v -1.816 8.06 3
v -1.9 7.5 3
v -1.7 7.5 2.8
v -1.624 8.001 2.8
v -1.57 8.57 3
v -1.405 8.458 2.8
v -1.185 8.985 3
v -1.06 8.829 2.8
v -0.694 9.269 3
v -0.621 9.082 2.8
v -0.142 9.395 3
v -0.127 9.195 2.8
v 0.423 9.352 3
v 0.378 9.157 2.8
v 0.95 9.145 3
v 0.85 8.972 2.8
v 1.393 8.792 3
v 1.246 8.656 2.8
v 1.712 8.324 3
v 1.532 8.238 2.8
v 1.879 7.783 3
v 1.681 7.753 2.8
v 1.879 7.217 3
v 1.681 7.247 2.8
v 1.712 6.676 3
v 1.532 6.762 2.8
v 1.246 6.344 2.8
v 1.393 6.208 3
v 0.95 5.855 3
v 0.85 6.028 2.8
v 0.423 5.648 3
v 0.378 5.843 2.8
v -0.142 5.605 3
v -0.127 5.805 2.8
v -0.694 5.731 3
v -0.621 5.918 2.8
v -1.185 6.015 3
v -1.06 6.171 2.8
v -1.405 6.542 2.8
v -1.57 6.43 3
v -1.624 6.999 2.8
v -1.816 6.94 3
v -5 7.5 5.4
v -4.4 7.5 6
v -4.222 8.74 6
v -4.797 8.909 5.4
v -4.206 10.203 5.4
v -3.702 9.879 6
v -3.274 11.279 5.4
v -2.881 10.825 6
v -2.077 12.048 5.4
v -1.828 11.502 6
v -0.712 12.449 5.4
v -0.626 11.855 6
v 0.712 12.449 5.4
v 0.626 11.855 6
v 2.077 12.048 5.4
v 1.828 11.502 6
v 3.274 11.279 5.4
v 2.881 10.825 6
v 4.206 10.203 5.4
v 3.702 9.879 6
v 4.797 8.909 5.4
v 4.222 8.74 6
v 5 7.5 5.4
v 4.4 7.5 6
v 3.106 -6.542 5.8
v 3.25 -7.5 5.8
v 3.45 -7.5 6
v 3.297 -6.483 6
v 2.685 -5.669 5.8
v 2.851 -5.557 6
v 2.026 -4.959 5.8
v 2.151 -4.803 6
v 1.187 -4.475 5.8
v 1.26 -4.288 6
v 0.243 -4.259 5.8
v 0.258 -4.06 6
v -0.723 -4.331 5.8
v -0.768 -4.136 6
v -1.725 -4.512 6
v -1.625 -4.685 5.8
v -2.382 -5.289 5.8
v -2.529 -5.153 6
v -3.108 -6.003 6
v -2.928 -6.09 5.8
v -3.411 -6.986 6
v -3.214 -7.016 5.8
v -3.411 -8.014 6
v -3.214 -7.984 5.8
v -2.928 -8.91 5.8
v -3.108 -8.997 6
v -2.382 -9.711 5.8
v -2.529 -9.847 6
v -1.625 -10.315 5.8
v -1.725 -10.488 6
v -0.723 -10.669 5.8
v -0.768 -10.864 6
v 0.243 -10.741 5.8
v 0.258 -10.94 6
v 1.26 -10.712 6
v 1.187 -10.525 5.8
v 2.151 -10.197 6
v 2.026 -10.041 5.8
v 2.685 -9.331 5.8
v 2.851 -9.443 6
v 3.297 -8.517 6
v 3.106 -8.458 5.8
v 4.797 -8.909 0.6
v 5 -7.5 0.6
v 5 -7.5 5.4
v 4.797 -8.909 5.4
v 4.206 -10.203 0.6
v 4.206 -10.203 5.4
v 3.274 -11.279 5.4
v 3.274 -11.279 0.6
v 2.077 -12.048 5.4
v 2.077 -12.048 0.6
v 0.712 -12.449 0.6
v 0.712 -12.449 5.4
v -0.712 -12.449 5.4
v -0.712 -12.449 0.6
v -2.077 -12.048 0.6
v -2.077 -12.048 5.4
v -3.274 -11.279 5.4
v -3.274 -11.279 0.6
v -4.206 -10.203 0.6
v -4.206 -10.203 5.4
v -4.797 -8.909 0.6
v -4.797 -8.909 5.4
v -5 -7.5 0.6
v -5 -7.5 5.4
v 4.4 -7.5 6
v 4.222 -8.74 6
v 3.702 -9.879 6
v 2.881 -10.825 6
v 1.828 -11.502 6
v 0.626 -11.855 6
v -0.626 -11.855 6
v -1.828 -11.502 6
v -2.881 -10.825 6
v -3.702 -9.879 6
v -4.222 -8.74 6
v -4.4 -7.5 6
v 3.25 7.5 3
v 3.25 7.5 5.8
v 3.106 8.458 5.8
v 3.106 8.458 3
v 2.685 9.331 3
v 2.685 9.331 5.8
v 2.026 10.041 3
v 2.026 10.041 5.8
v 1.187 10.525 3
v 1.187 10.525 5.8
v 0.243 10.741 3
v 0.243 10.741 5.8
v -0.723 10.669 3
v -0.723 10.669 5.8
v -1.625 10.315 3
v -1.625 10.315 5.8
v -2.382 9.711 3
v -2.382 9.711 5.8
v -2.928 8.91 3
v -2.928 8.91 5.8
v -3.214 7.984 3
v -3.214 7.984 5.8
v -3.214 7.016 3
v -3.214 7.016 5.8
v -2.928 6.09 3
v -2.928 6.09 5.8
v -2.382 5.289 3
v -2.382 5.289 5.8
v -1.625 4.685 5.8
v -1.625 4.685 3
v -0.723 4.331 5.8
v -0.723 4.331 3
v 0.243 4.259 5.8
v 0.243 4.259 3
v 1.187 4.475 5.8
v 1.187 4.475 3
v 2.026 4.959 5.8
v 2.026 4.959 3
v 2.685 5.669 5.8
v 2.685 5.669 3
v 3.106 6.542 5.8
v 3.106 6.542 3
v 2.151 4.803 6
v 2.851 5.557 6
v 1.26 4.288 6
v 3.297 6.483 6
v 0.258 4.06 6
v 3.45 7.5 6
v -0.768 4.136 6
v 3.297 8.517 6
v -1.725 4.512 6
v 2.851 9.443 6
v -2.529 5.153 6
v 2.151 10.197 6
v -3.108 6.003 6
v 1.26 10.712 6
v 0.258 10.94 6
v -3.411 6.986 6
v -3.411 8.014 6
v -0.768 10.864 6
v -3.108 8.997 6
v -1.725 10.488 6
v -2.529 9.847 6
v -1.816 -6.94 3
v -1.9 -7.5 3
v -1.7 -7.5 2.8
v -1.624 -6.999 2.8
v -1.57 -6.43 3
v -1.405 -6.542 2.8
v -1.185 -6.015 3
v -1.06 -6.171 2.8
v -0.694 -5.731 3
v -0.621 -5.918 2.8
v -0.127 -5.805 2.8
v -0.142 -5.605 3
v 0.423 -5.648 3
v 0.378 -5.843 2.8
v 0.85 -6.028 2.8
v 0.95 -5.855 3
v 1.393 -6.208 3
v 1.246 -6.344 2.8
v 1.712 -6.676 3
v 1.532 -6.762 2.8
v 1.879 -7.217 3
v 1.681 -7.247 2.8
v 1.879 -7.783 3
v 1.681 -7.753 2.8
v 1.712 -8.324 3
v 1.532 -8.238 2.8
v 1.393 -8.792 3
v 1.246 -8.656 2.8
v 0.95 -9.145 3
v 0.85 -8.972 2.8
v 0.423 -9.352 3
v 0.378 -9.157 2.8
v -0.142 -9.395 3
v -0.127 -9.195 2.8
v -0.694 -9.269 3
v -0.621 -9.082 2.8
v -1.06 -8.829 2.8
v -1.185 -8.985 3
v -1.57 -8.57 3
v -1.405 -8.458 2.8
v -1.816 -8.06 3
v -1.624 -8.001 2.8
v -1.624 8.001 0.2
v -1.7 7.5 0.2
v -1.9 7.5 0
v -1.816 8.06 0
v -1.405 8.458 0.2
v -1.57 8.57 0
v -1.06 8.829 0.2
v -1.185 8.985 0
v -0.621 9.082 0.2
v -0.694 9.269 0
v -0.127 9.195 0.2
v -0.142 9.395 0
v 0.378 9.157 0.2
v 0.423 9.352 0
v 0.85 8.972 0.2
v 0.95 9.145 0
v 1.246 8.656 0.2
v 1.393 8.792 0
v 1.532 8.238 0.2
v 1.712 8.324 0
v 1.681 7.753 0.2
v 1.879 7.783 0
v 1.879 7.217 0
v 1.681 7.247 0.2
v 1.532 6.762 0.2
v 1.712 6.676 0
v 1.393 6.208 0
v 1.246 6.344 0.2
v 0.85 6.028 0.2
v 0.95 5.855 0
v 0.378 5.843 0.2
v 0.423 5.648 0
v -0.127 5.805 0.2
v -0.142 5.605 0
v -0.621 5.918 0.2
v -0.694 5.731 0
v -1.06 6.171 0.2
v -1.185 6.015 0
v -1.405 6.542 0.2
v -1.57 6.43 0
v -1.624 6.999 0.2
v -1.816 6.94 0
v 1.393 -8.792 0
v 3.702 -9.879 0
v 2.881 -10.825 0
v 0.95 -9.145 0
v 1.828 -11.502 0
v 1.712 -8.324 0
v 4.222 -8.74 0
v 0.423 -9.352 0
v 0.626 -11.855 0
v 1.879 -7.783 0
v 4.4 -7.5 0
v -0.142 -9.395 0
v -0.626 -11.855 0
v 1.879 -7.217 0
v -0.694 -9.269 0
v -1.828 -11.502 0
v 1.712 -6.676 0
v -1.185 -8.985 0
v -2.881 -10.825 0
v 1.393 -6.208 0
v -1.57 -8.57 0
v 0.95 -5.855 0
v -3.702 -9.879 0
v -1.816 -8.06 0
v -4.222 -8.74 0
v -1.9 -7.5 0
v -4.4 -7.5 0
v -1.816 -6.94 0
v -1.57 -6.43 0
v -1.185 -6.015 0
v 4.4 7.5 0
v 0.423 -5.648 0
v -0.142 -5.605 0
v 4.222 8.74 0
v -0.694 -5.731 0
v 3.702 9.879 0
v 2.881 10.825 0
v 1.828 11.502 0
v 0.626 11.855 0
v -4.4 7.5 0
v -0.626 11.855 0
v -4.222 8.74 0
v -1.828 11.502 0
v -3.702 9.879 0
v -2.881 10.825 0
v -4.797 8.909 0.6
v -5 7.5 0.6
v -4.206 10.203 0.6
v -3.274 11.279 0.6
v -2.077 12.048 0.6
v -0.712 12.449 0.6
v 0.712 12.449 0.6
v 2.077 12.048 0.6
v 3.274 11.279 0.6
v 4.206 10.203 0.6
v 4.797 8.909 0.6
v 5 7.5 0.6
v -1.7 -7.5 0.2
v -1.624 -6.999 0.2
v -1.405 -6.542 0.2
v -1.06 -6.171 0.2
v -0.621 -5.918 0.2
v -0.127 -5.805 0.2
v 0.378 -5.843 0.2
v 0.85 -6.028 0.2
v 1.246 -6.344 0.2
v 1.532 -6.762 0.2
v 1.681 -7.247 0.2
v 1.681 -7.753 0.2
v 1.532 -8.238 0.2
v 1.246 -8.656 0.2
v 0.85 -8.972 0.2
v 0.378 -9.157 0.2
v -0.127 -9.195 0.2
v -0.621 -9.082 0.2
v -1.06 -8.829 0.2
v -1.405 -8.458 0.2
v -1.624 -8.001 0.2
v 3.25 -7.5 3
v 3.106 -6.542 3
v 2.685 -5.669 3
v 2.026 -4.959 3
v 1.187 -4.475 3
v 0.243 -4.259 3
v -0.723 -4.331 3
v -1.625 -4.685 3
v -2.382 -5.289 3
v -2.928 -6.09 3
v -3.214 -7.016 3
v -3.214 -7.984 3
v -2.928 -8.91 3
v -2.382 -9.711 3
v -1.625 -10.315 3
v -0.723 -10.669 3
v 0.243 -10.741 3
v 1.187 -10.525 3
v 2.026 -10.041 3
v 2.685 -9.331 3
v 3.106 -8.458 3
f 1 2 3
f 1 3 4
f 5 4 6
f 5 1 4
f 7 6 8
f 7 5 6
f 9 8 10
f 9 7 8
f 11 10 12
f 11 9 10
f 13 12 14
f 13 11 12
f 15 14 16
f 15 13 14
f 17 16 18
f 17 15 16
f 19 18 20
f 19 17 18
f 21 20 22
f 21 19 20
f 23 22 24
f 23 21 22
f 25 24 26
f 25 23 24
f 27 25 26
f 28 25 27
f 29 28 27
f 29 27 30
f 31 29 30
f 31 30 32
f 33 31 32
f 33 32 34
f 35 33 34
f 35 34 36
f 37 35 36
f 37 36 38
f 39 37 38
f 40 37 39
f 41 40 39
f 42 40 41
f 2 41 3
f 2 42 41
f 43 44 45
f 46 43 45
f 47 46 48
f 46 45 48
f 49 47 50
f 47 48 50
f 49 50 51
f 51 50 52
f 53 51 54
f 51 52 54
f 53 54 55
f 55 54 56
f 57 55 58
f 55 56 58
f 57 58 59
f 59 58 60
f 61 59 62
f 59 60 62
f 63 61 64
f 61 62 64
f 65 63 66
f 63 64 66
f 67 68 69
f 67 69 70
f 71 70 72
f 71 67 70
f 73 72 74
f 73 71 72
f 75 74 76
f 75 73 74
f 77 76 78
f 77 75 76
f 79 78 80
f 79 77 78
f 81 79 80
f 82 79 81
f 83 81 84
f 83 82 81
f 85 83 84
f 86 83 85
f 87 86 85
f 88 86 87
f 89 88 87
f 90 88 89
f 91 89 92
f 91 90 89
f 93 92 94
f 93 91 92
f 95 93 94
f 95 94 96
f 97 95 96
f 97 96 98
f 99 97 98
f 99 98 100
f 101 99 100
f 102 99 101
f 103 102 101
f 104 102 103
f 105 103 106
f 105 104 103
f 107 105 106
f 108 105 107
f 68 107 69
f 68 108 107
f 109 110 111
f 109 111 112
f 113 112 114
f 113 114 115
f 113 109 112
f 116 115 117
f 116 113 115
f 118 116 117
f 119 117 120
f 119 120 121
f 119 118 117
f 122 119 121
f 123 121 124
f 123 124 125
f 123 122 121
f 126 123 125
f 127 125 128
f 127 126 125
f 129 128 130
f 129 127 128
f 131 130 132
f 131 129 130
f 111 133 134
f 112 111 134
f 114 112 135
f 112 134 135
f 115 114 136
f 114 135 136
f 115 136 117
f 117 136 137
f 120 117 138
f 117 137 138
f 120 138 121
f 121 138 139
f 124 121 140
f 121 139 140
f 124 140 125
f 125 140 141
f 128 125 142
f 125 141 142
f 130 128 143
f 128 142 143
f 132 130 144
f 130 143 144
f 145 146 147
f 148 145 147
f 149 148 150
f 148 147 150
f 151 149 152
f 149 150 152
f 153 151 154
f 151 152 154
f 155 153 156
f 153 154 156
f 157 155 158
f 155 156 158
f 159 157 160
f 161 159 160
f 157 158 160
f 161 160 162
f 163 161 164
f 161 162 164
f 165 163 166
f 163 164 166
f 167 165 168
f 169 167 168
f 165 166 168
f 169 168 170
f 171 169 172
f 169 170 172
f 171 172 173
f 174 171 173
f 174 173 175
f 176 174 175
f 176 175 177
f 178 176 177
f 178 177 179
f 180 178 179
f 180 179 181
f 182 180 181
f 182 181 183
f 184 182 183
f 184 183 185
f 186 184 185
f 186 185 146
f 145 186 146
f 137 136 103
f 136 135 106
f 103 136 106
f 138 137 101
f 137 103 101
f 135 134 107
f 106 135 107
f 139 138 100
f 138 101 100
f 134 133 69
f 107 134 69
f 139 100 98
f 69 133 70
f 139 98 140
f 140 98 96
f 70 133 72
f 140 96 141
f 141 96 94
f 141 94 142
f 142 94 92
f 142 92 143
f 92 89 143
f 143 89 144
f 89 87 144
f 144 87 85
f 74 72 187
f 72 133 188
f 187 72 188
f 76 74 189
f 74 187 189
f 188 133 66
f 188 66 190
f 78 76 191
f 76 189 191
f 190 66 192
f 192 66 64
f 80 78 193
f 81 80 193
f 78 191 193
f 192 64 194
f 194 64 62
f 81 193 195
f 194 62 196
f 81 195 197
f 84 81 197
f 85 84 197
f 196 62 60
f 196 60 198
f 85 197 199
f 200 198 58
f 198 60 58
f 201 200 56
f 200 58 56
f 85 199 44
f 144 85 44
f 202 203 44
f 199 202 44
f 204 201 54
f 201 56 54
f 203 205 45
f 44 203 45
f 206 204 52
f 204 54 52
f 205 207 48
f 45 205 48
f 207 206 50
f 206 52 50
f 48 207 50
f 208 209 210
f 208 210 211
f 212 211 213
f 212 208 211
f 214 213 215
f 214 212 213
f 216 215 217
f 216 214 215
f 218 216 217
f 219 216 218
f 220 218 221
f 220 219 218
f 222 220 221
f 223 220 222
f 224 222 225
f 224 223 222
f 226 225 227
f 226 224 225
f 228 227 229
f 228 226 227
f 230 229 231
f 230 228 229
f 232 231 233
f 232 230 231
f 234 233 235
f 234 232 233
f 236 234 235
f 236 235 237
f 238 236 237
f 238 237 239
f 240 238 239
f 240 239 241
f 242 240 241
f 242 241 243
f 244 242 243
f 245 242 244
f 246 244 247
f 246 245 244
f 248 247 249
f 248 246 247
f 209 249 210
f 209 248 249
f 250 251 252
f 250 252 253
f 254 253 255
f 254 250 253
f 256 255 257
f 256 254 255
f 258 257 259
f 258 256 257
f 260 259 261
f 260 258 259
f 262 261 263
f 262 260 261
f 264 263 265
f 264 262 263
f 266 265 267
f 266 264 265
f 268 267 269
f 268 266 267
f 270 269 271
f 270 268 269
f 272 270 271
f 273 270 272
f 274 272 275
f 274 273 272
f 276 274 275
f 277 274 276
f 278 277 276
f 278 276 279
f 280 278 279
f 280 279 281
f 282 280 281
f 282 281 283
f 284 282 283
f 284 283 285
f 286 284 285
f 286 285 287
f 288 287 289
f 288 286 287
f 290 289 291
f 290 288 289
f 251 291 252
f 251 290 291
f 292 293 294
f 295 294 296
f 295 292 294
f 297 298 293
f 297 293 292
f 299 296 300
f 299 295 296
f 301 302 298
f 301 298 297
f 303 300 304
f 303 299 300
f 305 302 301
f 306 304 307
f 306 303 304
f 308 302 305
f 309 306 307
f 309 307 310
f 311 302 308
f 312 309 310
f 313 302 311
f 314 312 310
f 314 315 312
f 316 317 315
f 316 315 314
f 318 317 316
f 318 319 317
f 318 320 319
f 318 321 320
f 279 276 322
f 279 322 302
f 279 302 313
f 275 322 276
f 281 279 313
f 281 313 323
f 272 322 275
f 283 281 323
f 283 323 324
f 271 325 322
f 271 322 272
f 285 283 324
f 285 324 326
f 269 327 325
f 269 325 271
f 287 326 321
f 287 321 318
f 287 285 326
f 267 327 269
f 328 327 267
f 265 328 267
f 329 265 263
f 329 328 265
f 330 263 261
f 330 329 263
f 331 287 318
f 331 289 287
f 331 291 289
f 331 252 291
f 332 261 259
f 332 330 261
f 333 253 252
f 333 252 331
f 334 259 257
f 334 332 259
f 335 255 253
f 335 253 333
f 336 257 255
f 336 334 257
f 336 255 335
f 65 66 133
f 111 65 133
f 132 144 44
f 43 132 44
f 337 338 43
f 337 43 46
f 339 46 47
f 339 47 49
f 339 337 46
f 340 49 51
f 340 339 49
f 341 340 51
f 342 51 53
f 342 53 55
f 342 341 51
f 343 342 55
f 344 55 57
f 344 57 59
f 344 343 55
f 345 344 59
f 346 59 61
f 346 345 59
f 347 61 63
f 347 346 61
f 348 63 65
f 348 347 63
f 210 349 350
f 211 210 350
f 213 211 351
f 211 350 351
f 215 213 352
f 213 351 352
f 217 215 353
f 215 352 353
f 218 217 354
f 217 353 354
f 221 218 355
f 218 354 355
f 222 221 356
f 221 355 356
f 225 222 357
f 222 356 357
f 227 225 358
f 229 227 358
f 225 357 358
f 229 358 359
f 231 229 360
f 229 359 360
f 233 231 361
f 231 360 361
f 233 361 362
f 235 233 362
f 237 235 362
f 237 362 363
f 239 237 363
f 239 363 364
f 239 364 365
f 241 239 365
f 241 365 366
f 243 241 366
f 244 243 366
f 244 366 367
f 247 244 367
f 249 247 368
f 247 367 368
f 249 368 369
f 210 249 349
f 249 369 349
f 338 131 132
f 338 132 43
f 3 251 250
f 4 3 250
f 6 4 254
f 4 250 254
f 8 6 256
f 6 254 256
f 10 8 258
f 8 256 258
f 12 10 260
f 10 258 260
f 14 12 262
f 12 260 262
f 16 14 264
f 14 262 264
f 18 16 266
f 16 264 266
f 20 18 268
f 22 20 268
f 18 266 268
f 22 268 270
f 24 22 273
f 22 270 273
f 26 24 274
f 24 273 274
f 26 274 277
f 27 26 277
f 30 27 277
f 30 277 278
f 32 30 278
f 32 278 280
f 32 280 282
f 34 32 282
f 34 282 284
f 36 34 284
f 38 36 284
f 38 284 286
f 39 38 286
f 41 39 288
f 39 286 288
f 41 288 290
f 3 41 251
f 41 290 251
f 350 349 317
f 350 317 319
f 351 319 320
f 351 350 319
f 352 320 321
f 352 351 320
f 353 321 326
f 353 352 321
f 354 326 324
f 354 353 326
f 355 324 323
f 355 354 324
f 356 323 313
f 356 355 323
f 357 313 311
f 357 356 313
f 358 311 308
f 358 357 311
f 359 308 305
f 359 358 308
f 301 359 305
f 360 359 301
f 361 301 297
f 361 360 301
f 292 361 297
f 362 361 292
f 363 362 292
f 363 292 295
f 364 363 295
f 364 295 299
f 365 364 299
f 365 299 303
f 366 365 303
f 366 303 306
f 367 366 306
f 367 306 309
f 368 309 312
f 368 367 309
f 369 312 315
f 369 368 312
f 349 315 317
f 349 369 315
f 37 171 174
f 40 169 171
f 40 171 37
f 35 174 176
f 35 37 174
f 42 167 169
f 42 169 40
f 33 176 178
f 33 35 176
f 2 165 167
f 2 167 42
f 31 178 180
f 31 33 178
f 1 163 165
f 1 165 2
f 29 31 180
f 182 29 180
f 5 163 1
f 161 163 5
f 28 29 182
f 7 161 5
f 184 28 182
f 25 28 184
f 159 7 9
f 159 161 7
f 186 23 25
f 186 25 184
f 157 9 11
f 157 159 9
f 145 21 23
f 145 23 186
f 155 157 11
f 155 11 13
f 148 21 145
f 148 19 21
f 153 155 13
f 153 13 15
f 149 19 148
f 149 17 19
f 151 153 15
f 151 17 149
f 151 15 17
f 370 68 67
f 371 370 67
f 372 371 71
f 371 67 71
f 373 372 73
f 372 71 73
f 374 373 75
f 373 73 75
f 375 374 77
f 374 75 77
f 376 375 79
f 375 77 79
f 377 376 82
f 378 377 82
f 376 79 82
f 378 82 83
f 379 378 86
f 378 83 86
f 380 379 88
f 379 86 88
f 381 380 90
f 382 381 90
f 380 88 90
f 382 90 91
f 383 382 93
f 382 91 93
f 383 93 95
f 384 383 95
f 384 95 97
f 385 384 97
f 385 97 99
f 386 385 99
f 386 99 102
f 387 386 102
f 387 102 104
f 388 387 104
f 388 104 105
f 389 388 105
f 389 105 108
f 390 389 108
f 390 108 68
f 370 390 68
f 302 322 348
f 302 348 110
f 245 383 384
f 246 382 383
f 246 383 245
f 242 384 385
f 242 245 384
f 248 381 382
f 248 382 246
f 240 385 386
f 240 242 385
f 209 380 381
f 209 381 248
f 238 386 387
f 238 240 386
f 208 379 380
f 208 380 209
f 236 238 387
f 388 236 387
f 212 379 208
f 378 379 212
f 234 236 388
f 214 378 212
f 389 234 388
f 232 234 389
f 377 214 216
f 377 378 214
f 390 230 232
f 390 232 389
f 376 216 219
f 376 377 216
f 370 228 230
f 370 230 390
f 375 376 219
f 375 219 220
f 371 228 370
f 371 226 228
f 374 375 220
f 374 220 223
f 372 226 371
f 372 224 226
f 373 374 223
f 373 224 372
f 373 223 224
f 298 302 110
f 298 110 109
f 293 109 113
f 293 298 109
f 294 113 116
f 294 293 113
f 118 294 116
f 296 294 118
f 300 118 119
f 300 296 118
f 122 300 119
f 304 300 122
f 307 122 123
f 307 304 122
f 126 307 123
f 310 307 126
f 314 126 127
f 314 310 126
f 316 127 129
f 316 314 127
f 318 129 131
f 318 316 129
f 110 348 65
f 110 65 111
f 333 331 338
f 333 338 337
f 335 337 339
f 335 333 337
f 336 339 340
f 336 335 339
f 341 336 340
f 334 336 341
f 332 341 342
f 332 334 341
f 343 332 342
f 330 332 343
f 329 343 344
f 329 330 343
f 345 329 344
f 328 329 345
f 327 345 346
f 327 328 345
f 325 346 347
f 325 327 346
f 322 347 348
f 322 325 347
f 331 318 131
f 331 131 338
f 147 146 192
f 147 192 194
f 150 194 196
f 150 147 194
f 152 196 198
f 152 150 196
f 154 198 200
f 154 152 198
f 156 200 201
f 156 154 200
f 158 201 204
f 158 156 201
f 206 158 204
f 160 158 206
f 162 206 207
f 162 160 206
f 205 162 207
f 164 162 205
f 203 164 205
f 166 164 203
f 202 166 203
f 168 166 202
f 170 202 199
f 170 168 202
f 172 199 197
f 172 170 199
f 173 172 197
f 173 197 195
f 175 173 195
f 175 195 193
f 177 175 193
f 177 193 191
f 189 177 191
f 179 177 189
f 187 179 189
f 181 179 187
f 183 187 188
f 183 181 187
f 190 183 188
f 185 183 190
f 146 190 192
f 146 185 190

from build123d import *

# Parameters (mm, degrees)
BOSS_EXTRUDE1_DEPTH            = 6
CHAMFER1_SIZE                  = 0.6
CBORE_FOR_M3_SHCS1_D           = 3.4
CBORE_FOR_M3_SHCS1_CBORE_D     = 6.5
CBORE_FOR_M3_SHCS1_CBORE_DEPTH = 3
DEBURS_SIZE                    = 0.2


with BuildPart() as part:
    # Sketch1 → Boss-Extrude1 (new body)
    with BuildSketch(Plane.XY):
        with BuildLine():
            Line((-5, -7.5), (-5, 7.5))
            ThreePointArc((-5, 7.5), (0, 12.5), (5, 7.5))
            Line((5, 7.5), (5, -7.5))
            ThreePointArc((5, -7.5), (0, -12.5), (-5, -7.5))
        make_face()
    extrude(amount=BOSS_EXTRUDE1_DEPTH)

    # Chamfer1
    chamfer1_edges = [part.edges().sort_by_distance(p)[0] for p in [
        (0, 12.5, 6),
        (-5, 0, 6),
        (0, -12.5, 6),
        (-5, 0, 0),
        (0, 12.5, 0),
        (5, 0, 0),
        (0, -12.5, 0),
        (5, 0, 6),
    ]]
    chamfer(chamfer1_edges, length=CHAMFER1_SIZE)

    # CBORE for M3 SHCS1 (through all)
    with Locations(Plane.XY.offset(6)):
        with Locations((0, 7.5), (0, -7.5)):
            CounterBoreHole(CBORE_FOR_M3_SHCS1_D / 2, CBORE_FOR_M3_SHCS1_CBORE_D / 2, CBORE_FOR_M3_SHCS1_CBORE_DEPTH)

    # Deburs
    deburs_edges = [part.edges().sort_by_distance(p)[0] for p in [
        (-3.25, -7.5, 6),
        (1.7, -7.5, 0),
        (1.7, -7.5, 3),
        (-3.25, 7.5, 6),
        (1.7, 7.5, 0),
        (1.7, 7.5, 3),
    ]]
    chamfer(deburs_edges, length=DEBURS_SIZE)


solid = part.part
